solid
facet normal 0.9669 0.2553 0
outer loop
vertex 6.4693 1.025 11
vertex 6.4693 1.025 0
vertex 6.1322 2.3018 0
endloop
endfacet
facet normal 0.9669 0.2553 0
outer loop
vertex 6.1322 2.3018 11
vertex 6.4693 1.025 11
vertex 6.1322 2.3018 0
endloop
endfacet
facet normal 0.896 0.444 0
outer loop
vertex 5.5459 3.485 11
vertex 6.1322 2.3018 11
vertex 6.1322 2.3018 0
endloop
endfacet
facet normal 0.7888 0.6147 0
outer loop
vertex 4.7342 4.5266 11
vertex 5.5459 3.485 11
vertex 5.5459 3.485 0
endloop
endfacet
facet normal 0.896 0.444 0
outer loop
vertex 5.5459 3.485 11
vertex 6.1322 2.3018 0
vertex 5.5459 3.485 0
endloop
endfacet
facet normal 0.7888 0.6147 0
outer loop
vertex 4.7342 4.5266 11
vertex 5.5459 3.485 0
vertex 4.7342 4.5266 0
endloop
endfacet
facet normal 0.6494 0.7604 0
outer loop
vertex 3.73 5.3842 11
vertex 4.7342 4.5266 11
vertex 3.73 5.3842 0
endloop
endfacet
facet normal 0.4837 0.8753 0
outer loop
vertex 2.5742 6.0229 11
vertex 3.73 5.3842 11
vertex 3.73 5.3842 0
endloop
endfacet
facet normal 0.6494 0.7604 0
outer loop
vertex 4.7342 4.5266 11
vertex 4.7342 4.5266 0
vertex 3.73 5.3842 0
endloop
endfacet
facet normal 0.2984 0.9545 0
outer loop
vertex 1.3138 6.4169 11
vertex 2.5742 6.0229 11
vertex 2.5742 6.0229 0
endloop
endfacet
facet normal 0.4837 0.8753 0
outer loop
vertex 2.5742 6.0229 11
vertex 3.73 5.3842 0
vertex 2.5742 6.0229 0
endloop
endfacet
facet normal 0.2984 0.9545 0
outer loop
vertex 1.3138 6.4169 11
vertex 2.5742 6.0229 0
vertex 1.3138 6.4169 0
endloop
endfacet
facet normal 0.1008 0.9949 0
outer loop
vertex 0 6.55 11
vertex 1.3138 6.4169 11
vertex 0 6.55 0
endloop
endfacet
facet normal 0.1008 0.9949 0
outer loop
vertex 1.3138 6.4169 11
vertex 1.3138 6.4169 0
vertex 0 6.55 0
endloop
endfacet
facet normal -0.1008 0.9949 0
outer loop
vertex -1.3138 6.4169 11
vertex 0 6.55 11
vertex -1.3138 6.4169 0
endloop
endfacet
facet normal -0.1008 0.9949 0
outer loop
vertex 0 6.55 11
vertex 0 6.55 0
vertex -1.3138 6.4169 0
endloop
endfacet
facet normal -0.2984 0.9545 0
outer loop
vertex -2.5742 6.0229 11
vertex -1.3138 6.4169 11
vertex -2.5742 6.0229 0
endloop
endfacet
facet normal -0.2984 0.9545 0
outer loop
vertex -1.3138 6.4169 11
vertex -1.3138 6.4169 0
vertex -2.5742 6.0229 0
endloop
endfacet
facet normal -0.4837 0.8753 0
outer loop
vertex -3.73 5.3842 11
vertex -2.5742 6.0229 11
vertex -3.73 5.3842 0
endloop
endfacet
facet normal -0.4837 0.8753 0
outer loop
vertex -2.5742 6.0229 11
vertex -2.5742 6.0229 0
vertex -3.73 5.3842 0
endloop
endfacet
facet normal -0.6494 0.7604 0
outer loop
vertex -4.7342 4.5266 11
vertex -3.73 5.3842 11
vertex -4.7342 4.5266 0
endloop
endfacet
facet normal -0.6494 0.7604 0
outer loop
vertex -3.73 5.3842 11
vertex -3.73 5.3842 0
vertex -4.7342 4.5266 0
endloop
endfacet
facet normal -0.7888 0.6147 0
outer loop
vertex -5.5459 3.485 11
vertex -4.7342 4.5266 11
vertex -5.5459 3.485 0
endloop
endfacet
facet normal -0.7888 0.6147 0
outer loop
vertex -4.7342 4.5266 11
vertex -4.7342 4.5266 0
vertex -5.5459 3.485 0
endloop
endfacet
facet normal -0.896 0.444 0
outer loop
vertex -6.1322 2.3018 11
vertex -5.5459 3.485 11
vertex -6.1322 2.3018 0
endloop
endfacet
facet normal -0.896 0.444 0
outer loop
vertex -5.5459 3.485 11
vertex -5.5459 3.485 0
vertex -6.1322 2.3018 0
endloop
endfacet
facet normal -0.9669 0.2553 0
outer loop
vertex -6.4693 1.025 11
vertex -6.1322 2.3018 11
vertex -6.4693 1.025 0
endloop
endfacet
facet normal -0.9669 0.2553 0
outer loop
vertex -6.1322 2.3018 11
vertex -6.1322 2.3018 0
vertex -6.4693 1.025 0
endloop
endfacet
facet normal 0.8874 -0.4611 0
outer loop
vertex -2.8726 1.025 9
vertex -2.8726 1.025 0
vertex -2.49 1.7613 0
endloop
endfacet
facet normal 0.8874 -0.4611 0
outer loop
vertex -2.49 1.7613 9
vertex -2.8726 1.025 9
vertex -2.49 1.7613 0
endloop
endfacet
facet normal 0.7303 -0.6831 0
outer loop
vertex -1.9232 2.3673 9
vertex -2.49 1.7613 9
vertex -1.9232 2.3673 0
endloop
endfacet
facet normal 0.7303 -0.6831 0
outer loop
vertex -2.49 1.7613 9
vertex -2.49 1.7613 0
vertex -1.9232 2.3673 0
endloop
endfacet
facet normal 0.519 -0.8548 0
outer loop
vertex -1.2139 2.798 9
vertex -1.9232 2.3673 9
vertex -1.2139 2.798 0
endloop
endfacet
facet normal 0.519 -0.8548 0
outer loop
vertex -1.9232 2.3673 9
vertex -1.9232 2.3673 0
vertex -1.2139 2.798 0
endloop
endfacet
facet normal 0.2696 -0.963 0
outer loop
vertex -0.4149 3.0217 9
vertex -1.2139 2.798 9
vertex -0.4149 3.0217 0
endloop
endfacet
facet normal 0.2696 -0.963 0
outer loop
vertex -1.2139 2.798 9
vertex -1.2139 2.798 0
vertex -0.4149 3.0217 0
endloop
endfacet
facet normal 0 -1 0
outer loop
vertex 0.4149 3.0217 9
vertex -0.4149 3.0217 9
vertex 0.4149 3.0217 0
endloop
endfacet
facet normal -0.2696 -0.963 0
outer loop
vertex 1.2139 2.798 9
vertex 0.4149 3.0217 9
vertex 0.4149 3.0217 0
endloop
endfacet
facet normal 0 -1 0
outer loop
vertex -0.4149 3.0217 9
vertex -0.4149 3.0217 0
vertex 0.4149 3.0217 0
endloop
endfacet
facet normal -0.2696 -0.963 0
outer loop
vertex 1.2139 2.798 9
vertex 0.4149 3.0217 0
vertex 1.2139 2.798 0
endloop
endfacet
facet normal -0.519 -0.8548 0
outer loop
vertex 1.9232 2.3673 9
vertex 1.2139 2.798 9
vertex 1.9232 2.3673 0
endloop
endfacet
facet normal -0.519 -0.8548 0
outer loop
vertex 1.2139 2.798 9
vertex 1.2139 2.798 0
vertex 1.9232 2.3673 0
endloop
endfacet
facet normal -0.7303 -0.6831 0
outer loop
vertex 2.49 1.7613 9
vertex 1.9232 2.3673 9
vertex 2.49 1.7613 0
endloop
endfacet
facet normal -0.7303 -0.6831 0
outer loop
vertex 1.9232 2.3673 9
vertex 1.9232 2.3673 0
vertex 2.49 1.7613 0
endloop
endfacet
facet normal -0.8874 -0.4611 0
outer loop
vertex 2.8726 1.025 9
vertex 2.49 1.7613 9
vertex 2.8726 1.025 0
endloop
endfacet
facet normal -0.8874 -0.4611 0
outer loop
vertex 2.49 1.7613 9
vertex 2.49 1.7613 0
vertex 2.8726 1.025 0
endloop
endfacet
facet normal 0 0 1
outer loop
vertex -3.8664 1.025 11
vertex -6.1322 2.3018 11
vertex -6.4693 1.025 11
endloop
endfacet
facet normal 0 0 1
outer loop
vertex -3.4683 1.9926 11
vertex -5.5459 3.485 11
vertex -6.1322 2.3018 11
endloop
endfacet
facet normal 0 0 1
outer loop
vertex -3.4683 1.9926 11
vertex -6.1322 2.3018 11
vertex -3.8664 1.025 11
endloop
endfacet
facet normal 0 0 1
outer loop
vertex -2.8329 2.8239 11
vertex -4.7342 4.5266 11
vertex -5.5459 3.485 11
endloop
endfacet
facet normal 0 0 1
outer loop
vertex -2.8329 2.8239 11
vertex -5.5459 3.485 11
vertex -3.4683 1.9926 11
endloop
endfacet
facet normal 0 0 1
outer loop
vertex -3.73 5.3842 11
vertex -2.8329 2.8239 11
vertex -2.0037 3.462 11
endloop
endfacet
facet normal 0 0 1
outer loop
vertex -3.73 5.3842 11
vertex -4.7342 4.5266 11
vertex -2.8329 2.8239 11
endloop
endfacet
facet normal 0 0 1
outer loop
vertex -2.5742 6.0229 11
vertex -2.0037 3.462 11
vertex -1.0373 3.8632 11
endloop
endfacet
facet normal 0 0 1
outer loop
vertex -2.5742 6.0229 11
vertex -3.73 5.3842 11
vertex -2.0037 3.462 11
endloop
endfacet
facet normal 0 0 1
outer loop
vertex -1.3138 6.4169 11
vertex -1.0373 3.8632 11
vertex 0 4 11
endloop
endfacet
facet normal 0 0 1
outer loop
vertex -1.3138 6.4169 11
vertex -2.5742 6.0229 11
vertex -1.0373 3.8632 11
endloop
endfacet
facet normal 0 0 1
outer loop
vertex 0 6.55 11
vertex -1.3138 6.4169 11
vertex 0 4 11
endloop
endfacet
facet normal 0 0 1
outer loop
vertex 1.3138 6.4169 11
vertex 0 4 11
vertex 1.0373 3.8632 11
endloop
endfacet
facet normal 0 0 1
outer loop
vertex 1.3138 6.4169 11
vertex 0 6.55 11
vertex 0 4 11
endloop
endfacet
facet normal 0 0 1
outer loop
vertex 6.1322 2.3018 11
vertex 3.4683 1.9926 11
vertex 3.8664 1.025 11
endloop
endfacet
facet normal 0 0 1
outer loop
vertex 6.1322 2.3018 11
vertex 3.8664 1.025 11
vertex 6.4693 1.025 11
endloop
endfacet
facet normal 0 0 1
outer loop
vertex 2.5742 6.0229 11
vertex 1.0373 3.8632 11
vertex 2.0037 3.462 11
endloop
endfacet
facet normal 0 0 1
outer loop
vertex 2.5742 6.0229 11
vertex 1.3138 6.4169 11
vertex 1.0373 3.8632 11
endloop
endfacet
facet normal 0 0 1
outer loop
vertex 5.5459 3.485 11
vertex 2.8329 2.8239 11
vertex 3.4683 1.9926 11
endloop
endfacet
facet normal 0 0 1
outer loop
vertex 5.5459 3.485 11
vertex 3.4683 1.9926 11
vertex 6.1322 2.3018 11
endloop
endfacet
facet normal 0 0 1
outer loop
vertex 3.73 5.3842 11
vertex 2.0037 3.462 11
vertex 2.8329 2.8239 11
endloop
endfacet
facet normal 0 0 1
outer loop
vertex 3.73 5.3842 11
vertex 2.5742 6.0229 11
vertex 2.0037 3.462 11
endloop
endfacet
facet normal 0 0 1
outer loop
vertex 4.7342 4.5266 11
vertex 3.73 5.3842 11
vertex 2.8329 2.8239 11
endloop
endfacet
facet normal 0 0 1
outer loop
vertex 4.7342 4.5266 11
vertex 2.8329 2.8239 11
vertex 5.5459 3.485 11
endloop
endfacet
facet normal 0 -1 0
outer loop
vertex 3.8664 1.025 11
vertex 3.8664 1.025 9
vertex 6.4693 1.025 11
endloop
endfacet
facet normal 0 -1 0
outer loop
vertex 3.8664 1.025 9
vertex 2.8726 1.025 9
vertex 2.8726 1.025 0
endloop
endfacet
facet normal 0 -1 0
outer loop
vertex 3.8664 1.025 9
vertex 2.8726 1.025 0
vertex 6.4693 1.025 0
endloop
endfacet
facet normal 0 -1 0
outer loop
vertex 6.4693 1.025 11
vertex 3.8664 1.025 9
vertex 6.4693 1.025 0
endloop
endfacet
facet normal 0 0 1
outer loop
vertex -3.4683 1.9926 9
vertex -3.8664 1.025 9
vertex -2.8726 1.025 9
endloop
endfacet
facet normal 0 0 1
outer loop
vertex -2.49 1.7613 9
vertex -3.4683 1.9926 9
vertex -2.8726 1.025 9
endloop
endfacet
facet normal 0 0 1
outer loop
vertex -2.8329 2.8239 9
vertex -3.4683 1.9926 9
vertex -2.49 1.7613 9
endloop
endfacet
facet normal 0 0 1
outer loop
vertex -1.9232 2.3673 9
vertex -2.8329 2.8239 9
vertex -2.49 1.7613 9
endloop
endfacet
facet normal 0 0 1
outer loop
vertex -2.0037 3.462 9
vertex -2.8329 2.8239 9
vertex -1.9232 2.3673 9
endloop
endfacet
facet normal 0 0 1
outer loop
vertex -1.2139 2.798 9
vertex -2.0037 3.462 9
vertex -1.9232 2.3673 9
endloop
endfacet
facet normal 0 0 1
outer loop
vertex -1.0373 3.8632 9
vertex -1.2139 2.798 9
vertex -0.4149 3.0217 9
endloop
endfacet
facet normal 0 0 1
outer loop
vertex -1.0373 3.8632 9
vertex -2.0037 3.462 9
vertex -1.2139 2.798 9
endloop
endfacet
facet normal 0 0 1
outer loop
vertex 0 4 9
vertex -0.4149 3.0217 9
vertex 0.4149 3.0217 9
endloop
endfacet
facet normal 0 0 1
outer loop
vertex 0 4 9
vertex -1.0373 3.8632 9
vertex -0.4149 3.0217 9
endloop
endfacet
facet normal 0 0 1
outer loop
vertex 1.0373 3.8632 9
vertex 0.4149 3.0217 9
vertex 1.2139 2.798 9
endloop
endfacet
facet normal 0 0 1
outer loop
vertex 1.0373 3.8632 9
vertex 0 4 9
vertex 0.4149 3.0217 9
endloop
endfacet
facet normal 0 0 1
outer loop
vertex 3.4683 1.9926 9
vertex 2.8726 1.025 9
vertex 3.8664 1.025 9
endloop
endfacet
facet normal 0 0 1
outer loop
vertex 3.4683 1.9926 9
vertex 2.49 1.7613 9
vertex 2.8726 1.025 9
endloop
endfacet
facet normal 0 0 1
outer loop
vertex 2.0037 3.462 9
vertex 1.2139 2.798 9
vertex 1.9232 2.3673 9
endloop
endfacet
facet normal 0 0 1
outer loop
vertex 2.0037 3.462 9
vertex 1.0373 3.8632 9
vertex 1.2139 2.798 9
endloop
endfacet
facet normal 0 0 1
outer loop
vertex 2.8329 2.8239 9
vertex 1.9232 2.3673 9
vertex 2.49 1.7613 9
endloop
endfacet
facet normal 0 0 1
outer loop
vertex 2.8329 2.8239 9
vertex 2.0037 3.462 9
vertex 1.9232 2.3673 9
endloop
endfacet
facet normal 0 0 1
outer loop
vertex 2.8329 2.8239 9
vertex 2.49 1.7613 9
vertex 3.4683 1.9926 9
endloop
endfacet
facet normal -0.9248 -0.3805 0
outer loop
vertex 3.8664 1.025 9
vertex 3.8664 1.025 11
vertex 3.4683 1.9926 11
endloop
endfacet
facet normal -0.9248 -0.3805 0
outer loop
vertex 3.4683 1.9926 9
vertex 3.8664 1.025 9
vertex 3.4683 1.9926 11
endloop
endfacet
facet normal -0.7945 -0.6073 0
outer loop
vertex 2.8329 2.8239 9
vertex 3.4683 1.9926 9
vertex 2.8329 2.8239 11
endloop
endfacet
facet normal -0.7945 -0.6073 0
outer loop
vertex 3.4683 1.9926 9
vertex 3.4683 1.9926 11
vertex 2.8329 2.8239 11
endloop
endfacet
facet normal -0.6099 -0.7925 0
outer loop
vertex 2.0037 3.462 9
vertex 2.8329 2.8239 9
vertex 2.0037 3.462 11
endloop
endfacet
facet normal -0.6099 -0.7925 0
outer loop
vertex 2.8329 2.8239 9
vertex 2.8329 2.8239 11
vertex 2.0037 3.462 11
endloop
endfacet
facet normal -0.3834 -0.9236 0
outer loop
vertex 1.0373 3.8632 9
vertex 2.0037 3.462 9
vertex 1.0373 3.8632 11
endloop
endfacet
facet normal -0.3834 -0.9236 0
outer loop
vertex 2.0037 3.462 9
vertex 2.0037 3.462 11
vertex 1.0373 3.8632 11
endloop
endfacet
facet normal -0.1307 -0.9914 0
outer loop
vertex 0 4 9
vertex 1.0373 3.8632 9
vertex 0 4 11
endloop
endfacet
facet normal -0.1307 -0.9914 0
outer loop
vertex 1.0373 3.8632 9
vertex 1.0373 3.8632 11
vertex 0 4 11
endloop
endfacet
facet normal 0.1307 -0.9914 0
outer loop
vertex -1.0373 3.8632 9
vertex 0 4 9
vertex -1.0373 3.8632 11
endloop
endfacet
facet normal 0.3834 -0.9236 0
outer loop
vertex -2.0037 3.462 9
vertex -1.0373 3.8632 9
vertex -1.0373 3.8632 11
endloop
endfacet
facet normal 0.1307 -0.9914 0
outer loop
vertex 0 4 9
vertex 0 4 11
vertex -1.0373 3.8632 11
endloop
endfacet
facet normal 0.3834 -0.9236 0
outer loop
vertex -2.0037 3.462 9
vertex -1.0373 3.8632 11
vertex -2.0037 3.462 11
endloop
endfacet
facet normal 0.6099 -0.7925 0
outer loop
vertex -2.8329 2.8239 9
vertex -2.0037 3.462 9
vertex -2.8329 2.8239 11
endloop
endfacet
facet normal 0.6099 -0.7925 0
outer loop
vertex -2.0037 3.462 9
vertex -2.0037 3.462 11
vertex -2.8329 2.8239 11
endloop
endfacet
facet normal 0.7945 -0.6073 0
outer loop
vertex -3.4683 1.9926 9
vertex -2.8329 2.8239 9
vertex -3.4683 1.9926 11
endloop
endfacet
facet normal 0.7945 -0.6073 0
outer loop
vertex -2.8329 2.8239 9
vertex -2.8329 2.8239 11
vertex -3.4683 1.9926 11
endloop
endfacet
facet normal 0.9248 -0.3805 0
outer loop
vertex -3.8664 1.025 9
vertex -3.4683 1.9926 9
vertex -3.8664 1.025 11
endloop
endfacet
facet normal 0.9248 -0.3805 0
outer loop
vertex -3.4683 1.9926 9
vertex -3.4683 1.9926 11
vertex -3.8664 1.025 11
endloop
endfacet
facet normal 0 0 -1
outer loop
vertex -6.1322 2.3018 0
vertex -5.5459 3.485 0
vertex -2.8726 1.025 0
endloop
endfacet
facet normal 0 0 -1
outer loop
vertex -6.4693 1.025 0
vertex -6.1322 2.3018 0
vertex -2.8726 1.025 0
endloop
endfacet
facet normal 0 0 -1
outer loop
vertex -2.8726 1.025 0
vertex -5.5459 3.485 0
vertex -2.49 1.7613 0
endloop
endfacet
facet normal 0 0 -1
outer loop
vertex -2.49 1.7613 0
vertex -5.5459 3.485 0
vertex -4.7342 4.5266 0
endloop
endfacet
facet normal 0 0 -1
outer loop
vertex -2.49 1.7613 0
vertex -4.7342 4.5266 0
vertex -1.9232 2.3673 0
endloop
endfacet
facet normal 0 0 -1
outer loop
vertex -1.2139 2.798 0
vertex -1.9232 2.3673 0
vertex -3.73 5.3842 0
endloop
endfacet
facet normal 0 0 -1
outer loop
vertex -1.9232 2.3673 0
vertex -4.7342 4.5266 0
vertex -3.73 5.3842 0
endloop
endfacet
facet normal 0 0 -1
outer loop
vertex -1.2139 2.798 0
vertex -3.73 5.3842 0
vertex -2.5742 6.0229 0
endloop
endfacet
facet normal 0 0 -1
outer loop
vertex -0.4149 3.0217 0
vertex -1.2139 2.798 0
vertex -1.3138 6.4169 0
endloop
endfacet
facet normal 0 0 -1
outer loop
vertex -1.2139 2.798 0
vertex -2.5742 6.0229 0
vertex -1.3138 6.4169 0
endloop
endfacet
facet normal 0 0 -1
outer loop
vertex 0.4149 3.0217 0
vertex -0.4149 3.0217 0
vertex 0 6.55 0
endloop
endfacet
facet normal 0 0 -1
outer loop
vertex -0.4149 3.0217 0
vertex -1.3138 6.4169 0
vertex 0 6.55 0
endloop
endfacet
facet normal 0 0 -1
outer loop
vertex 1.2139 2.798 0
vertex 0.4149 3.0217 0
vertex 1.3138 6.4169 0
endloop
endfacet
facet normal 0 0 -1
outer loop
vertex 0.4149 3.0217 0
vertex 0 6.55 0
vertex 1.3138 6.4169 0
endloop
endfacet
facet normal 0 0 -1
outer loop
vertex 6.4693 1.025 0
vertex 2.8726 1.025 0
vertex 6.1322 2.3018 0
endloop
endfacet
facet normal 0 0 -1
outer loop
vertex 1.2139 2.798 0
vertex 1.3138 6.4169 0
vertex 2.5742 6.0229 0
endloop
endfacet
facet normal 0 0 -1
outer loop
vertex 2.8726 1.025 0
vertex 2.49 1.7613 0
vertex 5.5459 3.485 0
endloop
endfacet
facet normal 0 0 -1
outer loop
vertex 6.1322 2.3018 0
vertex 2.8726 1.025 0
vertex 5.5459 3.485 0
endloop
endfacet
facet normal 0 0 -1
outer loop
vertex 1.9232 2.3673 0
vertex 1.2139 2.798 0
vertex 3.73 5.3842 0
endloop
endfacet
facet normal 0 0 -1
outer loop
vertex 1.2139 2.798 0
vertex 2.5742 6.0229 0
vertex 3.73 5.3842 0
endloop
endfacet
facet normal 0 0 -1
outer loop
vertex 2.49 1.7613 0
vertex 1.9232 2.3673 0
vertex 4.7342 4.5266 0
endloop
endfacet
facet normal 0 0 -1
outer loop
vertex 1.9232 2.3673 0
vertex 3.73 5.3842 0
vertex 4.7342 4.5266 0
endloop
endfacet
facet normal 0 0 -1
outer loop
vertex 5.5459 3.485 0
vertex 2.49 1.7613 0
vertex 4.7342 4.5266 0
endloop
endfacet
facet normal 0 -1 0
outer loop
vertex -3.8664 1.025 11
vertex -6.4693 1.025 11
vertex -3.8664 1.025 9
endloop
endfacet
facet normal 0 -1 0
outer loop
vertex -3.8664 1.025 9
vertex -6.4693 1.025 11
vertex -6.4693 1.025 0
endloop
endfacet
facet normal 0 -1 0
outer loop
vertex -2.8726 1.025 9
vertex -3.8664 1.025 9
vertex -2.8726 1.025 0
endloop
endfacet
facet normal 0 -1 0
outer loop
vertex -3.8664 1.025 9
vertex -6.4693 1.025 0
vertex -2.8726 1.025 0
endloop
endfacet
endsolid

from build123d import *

# Parameters (mm, degrees)
F1_DEPTH = 11
F3_DEPTH = 2


with BuildPart() as f1:
    # F0 (on Top) → F1 (new body)
    with BuildSketch(Plane.XY):
        with BuildLine():
            ThreePointArc((-2.8726077003, 1.025), (0, 3.05), (2.8726077003, 1.025))
            Line((2.8726077003, 1.025), (6.4693025126, 1.025))
            ThreePointArc((6.4693025126, 1.025), (0, 6.55), (-6.4693025126, 1.025))
            Line((-6.4693025126, 1.025), (-2.8726077003, 1.025))
        make_face()
    extrude(amount=F1_DEPTH)

    # F2 (on face) → F3 (cut, through all)
    with BuildSketch(Plane.XY.offset(11)):
        with BuildLine():
            Line((2.8726077003, 1.025), (3.866442163, 1.025))
            ThreePointArc((3.866442163, 1.025), (0, 4), (-3.866442163, 1.025))
            Line((-3.866442163, 1.025), (-2.8726077003, 1.025))
            ThreePointArc((-2.8726077003, 1.025), (0, 3.05), (2.8726077003, 1.025))
        make_face()
    extrude(amount=-F3_DEPTH, mode=Mode.SUBTRACT)


solid = f1.part
